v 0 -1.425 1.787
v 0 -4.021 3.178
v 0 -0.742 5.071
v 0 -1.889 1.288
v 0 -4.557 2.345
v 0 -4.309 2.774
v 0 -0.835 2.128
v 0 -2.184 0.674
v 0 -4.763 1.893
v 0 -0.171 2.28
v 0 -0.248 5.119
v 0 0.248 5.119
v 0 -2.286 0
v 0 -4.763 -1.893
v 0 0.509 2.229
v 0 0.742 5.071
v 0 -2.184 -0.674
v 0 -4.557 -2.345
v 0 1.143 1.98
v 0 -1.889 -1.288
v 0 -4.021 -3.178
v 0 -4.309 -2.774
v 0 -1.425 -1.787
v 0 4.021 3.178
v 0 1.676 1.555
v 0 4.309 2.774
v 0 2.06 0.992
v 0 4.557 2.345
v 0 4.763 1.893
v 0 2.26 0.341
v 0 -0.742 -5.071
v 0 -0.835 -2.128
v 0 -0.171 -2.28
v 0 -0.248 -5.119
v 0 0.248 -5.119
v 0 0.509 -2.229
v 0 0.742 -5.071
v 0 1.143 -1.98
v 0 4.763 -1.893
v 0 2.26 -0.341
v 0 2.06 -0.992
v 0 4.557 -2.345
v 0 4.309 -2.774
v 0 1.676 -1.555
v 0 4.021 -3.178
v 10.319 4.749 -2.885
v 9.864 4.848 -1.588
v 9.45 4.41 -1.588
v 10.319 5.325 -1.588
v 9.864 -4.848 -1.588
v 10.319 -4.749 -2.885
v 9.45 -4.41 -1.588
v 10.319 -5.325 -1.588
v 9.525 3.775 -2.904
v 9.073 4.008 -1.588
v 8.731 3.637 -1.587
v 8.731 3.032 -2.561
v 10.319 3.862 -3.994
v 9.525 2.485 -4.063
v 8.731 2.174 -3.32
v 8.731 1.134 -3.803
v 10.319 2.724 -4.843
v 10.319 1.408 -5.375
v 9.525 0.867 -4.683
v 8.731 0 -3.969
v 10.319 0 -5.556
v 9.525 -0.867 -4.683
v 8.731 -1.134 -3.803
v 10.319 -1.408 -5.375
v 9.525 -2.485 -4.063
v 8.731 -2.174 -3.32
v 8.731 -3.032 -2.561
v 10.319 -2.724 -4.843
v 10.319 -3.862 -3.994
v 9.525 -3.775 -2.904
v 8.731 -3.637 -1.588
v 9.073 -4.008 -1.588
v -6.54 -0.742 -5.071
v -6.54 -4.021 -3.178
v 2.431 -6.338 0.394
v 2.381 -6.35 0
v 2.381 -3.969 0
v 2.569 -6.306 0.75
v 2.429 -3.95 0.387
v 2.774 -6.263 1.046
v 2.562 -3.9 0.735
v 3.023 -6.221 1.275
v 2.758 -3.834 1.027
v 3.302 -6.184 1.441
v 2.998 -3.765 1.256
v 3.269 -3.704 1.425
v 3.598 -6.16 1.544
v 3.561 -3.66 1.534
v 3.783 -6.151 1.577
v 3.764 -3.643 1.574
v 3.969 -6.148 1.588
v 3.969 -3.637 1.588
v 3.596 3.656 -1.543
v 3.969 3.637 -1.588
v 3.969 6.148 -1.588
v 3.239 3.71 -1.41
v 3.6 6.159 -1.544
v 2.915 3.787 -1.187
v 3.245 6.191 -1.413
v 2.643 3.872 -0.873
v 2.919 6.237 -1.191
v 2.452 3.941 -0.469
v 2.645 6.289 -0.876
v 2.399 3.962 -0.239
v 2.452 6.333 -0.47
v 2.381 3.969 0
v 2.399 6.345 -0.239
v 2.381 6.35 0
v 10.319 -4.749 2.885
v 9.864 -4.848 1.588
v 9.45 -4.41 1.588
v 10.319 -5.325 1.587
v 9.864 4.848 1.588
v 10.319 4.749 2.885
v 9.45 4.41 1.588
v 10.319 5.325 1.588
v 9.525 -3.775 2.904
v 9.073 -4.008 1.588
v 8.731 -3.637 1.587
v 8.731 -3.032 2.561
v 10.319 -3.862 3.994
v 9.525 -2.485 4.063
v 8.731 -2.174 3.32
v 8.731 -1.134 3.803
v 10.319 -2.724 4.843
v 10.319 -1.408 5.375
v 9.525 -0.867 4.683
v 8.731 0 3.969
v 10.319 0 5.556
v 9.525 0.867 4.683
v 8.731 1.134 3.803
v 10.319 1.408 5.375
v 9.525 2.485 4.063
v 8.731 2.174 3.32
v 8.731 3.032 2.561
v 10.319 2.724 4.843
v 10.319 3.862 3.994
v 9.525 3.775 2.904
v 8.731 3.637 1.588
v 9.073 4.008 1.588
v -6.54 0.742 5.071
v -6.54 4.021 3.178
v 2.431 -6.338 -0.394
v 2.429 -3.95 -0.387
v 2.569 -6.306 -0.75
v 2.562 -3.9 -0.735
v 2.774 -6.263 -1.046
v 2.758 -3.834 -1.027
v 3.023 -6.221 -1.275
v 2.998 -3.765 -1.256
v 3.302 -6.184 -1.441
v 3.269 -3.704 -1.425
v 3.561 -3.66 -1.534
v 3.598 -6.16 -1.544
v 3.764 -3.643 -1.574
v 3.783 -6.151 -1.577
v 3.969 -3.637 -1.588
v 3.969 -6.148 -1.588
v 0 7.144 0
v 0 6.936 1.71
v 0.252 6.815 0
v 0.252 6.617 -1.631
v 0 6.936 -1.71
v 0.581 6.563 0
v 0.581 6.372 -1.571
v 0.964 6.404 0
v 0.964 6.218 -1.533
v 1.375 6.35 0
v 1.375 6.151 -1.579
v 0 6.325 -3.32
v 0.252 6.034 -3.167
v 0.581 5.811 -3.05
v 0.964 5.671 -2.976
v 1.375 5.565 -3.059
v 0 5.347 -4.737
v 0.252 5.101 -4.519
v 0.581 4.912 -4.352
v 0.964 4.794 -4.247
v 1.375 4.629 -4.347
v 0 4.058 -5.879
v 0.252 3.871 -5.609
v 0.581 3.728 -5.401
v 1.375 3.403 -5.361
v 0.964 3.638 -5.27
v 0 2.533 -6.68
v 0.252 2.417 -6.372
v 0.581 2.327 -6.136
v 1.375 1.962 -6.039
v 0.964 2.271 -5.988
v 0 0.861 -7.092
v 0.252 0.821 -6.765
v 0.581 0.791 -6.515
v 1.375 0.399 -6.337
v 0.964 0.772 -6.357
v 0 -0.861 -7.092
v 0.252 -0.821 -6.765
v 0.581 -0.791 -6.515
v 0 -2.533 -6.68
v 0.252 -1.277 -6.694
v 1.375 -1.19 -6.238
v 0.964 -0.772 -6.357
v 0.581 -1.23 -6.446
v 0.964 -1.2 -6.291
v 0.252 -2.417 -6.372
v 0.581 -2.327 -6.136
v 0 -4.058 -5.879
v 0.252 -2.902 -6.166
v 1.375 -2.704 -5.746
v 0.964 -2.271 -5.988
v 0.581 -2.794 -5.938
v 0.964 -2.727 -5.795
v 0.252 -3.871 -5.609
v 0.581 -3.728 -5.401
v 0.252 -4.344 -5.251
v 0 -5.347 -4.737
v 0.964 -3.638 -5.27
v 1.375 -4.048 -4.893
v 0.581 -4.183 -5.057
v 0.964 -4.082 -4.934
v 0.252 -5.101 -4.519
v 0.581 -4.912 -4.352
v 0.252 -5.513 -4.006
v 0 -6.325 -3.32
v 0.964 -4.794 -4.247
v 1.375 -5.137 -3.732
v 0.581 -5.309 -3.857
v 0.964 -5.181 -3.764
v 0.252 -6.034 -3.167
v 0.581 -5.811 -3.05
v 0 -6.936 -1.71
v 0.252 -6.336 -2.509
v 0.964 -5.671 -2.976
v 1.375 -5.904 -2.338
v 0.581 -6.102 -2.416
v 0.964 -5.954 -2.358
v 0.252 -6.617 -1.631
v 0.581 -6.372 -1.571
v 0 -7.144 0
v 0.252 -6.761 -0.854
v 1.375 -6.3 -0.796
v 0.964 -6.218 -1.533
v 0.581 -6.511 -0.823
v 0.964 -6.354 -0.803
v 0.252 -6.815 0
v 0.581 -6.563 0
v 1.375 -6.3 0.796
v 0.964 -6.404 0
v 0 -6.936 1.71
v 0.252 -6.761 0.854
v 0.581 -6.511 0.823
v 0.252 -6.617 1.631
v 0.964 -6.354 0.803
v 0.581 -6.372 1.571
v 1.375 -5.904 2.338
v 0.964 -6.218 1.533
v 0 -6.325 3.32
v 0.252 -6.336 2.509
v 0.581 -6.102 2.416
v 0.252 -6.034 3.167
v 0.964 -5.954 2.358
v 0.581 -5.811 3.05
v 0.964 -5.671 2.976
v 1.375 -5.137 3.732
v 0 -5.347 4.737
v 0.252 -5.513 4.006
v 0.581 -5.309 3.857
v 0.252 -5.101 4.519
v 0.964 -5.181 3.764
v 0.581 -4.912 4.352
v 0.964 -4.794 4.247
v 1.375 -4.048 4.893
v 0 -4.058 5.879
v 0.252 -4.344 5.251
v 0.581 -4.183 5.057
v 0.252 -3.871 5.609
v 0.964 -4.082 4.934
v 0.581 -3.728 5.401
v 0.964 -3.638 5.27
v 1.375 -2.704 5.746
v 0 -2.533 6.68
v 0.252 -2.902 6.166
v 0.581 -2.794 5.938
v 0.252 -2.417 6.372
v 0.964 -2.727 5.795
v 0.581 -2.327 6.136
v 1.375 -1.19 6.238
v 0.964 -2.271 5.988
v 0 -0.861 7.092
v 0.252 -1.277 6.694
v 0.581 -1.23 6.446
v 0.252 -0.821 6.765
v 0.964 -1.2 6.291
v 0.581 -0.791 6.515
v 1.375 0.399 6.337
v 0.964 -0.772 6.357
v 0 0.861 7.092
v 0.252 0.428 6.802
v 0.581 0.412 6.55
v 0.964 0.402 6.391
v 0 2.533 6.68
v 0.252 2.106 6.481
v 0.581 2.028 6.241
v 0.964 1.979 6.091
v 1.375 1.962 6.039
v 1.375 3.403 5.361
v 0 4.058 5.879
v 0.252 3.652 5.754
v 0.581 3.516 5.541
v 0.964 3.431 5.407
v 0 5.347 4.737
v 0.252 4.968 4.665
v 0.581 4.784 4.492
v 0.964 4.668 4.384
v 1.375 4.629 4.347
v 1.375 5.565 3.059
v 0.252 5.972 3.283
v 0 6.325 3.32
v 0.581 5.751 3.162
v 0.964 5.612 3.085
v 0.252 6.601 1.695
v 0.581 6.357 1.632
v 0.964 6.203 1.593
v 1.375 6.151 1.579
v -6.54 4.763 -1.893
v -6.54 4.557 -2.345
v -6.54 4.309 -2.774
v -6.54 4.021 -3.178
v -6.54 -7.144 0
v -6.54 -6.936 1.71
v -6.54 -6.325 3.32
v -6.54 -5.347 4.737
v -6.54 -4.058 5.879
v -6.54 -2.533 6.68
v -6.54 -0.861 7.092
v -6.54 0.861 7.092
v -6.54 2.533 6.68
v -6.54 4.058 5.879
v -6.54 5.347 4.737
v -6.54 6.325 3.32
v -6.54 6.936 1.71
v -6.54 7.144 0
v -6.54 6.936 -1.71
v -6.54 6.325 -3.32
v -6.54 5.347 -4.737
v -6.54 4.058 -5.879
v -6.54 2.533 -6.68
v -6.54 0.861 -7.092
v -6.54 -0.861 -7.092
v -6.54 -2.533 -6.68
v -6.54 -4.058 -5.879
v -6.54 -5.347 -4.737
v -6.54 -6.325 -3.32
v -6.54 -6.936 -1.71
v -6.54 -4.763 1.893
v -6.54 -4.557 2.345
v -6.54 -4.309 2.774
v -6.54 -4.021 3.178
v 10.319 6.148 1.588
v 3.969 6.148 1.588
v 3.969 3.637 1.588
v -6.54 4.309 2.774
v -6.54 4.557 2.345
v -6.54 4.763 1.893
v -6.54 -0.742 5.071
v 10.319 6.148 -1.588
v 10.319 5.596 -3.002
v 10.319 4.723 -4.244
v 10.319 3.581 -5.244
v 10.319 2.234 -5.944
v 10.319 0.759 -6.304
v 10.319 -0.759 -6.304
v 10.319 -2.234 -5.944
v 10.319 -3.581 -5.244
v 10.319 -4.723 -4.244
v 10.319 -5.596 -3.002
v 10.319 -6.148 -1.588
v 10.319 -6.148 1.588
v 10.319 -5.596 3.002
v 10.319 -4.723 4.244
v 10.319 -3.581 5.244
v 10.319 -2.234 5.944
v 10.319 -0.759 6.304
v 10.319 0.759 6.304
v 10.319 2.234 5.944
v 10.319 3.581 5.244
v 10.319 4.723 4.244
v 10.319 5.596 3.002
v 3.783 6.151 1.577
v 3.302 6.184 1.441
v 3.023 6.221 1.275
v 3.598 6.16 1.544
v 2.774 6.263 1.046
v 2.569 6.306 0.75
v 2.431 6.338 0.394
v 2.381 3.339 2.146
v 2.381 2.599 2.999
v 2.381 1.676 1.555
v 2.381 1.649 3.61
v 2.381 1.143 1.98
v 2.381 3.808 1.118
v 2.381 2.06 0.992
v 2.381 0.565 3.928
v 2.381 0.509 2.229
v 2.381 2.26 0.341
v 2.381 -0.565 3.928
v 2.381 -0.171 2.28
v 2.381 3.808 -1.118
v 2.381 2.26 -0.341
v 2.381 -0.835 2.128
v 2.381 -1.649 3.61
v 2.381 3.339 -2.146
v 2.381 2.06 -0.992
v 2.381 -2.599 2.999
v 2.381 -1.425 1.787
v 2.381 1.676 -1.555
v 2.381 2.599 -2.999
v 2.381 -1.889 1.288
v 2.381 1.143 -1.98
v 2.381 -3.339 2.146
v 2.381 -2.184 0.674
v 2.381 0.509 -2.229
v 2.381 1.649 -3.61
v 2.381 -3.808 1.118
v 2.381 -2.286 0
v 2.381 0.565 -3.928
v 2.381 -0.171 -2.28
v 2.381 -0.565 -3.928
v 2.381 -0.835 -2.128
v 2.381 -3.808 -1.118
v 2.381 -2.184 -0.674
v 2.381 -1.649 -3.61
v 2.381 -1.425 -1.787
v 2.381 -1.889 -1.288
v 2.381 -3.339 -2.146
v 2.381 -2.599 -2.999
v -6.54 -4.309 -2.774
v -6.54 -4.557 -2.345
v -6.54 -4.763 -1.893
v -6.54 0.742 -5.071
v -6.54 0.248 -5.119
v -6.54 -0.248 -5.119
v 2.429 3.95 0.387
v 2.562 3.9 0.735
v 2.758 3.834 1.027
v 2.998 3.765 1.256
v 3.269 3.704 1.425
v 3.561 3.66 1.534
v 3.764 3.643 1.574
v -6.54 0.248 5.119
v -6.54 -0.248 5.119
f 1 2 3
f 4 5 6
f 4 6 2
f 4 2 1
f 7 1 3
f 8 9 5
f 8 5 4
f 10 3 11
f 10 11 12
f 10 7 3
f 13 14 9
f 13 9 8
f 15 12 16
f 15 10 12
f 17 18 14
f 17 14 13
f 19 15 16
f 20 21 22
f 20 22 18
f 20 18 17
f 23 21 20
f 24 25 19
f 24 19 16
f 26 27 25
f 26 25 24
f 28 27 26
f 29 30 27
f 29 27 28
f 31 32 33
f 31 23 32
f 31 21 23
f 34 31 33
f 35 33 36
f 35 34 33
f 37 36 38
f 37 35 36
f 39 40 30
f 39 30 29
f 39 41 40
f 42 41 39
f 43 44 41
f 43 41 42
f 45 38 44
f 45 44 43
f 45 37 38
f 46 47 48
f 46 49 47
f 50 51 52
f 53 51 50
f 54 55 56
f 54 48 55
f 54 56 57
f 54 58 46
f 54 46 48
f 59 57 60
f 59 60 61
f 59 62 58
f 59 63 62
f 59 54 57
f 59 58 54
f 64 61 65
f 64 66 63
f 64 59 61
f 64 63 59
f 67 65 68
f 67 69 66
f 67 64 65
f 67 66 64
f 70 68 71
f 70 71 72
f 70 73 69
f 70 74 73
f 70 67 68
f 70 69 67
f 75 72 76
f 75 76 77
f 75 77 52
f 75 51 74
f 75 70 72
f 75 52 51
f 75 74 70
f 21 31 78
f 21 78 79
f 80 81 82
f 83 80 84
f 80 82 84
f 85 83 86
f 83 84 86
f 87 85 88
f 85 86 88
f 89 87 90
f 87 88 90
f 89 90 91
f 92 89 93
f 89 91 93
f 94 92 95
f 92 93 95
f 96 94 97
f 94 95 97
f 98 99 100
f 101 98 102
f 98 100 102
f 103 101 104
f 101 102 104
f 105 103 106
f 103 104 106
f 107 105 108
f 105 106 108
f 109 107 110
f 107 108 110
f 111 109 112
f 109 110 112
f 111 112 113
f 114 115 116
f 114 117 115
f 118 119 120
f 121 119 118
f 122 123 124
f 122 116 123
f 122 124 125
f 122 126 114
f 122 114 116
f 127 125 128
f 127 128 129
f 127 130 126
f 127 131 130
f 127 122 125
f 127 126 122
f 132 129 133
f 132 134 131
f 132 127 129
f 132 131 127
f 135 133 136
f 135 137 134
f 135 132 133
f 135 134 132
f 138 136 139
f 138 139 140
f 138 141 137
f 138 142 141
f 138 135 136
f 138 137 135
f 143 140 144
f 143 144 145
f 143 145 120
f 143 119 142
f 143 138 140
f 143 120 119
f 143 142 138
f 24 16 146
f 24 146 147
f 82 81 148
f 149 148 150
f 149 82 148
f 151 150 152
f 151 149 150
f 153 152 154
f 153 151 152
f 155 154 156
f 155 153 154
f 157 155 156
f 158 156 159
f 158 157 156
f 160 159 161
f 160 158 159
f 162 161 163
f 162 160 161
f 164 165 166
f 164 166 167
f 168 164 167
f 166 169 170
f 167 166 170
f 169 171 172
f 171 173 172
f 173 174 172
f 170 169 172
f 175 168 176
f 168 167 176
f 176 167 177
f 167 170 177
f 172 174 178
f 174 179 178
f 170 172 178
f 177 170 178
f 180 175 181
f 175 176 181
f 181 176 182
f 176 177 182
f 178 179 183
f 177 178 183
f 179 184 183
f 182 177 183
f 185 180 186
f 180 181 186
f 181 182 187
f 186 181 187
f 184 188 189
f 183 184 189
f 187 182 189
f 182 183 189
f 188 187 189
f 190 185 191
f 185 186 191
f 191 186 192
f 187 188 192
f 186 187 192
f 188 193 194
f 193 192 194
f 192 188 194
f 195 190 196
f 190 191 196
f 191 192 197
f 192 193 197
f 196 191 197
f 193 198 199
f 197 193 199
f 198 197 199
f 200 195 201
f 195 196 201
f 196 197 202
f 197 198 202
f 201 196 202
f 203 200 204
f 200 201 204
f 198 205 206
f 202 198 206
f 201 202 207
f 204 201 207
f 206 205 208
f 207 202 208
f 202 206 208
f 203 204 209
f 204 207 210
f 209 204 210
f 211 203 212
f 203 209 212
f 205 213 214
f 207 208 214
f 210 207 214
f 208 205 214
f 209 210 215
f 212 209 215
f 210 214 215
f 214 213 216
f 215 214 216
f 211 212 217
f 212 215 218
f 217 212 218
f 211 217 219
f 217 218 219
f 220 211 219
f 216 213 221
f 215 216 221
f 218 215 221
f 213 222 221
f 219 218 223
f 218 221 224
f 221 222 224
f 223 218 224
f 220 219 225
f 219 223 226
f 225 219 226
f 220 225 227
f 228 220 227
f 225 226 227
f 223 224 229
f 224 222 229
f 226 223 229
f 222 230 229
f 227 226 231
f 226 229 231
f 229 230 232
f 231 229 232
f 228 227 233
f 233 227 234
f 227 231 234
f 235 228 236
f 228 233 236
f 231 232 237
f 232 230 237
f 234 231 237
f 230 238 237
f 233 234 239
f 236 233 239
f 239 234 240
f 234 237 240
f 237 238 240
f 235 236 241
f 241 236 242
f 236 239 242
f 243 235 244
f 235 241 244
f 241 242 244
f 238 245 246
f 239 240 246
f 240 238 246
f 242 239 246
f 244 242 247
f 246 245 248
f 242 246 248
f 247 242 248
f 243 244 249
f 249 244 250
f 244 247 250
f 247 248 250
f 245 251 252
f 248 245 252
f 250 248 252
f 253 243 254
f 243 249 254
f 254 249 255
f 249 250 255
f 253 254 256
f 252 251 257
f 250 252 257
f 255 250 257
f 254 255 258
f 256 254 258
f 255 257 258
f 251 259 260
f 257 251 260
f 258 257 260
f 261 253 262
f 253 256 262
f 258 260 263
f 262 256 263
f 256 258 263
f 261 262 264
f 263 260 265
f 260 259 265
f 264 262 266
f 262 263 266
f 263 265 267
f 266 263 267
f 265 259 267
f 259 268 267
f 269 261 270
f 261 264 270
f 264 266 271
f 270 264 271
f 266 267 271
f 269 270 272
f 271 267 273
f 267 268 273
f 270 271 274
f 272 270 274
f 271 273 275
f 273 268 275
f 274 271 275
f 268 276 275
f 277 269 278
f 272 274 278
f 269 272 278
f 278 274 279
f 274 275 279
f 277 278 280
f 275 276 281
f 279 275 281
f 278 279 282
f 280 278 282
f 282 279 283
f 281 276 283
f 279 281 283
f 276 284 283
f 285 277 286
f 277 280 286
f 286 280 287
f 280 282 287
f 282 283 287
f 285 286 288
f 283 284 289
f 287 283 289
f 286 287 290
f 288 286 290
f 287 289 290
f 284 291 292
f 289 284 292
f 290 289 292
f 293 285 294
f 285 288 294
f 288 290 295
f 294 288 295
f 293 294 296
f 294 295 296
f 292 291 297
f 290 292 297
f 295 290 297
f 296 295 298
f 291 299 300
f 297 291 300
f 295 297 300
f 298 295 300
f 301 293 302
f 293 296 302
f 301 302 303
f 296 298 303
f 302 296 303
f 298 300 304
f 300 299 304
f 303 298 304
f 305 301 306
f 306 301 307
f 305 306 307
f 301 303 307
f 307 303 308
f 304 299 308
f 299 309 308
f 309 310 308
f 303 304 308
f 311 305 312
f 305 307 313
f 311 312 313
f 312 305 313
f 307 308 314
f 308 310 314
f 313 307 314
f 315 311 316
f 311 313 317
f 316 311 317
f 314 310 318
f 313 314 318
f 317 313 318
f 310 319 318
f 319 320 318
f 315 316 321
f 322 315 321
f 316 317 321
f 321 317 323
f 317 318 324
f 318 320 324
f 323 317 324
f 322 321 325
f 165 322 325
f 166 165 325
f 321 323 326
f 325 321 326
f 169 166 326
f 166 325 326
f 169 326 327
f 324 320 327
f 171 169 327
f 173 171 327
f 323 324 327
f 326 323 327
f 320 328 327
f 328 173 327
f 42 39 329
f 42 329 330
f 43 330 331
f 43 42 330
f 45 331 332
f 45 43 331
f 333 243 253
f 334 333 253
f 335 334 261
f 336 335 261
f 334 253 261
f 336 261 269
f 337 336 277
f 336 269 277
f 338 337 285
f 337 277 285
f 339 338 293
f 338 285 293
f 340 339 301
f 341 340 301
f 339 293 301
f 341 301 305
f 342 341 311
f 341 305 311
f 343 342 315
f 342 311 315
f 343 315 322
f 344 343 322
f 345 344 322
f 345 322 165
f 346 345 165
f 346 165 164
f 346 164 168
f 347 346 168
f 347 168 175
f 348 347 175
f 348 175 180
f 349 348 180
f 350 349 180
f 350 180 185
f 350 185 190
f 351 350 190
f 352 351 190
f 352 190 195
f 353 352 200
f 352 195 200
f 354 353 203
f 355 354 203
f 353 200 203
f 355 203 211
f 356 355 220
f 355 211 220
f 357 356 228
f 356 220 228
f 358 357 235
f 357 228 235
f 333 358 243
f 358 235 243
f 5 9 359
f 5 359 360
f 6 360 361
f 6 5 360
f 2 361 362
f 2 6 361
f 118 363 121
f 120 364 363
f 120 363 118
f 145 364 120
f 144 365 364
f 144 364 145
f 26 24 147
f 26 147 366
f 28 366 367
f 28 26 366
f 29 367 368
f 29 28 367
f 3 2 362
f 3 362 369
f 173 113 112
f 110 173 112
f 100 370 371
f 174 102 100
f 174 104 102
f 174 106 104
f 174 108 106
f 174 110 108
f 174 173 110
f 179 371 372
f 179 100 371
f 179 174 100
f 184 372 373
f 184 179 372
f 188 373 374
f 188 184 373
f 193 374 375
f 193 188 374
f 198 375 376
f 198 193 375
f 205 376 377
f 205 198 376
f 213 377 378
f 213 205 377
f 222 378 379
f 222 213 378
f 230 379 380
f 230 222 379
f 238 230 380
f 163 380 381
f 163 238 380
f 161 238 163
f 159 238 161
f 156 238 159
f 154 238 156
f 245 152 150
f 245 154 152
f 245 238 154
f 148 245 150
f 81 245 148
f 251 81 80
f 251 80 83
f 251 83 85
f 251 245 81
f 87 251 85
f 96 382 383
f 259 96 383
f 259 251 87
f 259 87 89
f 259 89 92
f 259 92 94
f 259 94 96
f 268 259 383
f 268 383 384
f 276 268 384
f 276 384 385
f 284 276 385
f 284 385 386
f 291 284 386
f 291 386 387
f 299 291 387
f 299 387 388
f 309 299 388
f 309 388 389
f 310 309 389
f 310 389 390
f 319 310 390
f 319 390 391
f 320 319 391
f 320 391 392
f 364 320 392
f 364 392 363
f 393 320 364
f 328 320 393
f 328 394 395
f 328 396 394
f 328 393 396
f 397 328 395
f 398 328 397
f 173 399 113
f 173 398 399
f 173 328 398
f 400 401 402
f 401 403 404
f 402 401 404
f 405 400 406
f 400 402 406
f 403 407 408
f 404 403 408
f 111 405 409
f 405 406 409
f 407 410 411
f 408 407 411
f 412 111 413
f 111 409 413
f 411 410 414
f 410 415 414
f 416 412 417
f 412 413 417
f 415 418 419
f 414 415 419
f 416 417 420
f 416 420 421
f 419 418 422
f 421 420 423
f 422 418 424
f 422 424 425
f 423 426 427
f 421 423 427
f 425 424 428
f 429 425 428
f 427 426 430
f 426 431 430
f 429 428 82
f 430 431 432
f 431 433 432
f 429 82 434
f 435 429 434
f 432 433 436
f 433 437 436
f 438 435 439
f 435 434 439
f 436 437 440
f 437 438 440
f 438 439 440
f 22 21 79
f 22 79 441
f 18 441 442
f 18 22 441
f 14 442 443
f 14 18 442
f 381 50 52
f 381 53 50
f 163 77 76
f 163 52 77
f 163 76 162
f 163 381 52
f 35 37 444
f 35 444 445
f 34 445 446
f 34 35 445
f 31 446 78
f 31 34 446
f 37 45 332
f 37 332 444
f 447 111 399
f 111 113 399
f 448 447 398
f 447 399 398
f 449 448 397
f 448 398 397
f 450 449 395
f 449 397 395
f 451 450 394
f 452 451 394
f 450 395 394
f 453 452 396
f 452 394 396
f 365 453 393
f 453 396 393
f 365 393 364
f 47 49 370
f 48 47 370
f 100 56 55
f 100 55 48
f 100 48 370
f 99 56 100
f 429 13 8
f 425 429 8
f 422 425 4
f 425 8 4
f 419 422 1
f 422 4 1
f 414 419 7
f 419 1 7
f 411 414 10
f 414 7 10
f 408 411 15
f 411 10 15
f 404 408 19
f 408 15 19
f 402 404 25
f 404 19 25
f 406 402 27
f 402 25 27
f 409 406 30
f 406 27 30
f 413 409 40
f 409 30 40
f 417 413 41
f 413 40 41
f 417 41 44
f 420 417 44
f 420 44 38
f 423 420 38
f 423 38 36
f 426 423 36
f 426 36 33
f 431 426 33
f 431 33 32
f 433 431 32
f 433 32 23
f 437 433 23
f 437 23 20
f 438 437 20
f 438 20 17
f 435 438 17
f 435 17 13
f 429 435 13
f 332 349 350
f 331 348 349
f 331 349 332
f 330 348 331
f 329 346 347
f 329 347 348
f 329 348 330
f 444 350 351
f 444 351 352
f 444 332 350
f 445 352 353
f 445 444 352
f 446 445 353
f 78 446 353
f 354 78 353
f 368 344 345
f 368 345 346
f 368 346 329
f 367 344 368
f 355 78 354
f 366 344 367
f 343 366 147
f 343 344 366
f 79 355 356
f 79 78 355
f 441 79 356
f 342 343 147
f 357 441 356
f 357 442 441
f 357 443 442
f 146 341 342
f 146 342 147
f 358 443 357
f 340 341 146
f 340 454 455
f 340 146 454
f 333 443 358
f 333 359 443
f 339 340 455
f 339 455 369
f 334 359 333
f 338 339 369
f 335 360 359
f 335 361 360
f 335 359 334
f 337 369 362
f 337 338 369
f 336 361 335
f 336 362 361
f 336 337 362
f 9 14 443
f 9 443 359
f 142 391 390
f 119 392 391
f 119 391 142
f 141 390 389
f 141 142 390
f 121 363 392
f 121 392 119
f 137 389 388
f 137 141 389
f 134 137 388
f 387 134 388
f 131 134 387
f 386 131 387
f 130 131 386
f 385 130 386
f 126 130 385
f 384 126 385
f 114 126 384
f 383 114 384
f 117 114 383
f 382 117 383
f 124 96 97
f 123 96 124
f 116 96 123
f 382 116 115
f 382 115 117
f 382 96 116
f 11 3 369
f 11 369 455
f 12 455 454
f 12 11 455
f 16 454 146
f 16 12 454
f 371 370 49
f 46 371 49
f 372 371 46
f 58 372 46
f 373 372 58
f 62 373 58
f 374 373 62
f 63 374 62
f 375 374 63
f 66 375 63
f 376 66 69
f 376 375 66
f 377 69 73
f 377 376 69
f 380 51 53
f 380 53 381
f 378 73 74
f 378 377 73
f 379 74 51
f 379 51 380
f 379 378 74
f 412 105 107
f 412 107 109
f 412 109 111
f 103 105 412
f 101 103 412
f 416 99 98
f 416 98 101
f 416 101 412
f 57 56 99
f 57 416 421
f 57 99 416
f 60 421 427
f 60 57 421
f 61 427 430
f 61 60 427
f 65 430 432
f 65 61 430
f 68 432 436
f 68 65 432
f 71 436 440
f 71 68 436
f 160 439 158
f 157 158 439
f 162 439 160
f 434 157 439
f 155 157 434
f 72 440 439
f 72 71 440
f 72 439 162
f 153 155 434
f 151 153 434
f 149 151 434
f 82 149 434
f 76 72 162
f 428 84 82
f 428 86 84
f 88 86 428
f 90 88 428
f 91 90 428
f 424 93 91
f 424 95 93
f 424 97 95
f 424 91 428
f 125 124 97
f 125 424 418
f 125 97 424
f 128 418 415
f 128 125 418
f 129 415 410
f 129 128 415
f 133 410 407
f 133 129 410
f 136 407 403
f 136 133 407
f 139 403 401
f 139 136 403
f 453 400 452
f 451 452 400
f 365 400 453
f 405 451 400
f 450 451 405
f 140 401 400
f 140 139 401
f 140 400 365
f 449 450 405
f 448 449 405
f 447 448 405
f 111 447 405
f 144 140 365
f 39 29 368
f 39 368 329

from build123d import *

# Parameters (mm, degrees)
SKETCH1_W               = 25.4
SKETCH1_H               = 3.175
SKETCH1_W_2             = 1.5875
SKETCH1_H_2             = 1.5875
SKETCH1_W_3             = 7.9375
SKETCH1_H_3             = 2.38125
CUT_EXTRUDE1_DEPTH      = 27.940768363
CUT_EXTRUDE1_DEPTH_BACK = 27.940768363
SKETCH2_W               = 0.79375
SKETCH2_H               = 3.175
SKETCH2_R               = 1.5875
FILLET1_R               = 1.5875
CHAMFER1_SIZE           = 1.5875
CUT_EXTRUDE2_DEPTH      = 27.94076841
SKETCH3_3_R             = 2.286
CUT_EXTRUDE3_DEPTH      = 14.67923997
SKETCH3_4_R             = 7.14375
BOSS_EXTRUDE1_DEPTH     = 6.5405
FILLET2_R               = 1.5875


# Some blends are built 0.0001 mm under size
with BuildPart() as part:
    # Sketch1 → Revolve1 (revolve)
    with BuildSketch(Plane.XY):
        with Locations((-12.7, 1.5875)):
            Rectangle(SKETCH1_W, SKETCH1_H)
        with Locations((-0.79375, 3.96875)):
            Rectangle(SKETCH1_W_2, SKETCH1_H_2)
        Polygon((0, 3.175), (0, 0), (2.38125, 0), (2.38125, 3.96875), (2.38125, 6.35), (0, 6.35), (0, 4.7625), align=None)
        with Locations((6.35, 5.159375)):
            Rectangle(SKETCH1_W_3, SKETCH1_H_3)
    revolve(axis=Axis((0, 0, 0), (-1, 0, 0)))

    # Sketch2 → Cut-Extrude1 (cut, two sides: drawn at the far end of the back side and taken through both)
    with BuildSketch(Plane(origin=(0, 0, 0), x_dir=(1, 0, 0), z_dir=(0, 1, 0)).offset(-CUT_EXTRUDE1_DEPTH_BACK)):
        with Locations((2.778125, 0)):
            Rectangle(SKETCH2_W, SKETCH2_H)
        with BuildLine():
            Line((3.175, -1.5875), (6.35, -1.5875))
            ThreePointArc((6.35, -1.5875), (4.7625, 0), (6.35, 1.5875))
            Line((6.35, 1.5875), (3.175, 1.5875))
            Line((3.175, 1.5875), (3.175, -1.5875))
        make_face()
        with Locations((6.35, 0)):
            Circle(SKETCH2_R)
        with BuildLine():
            Line((6.35, -1.5875), (10.31875, -1.5875))
            Line((10.31875, -1.5875), (10.31875, 1.5875))
            Line((10.31875, 1.5875), (6.35, 1.5875))
            ThreePointArc((6.35, 1.5875), (7.472532015, 1.122532015), (7.9375, 0))
            ThreePointArc((7.9375, 0), (7.472532015, -1.122532015), (6.35, -1.5875))
        make_face()
    extrude(amount=CUT_EXTRUDE1_DEPTH + CUT_EXTRUDE1_DEPTH_BACK, mode=Mode.SUBTRACT)

    # Fillet1
    fillet1_edges = [part.edges().sort_by_distance(p)[0] for p in [
        (2.38125, -4.89289026, -1.5875),
        (2.38125, 4.89289026, -1.5875),
        (2.38125, -4.89289026, 1.5875),
        (2.38125, 4.89289026, 1.5875),
    ]]
    fillet(fillet1_edges, radius=FILLET1_R - 0.0001)  # a hair under: the kernel refuses the full size

    # Chamfer1
    chamfer1_edges = [part.edges().sort_by_distance(p)[0] for p in [
        (10.31875, 0, 3.96875),
        (10.31875, 0, -3.96875),
    ]]
    chamfer(chamfer1_edges, length=CHAMFER1_SIZE)

    # Sketch3 → Cut-Extrude2 (cut, through all)
    with BuildSketch(Plane.ZY):
        with BuildLine():
            Line((-5.034429311, 5.567612646), (-7.338908645, 1.576137354))
            ThreePointArc((-7.338908645, 1.576137354), (-7.50625, 0), (-7.338908645, -1.576137354))
            Line((-7.338908645, -1.576137354), (-5.034429311, -5.567612646))
            ThreePointArc((-5.034429311, -5.567612646), (-3.753125, -6.500603187), (-2.304479334, -7.14375))
            Line((-2.304479334, -7.14375), (2.304479334, -7.14375))
            ThreePointArc((2.304479334, -7.14375), (3.753125, -6.500603187), (5.034429311, -5.567612646))
            Line((5.034429311, -5.567612646), (7.338908645, -1.576137354))
            ThreePointArc((7.338908645, -1.576137354), (7.50625, 0), (7.338908645, 1.576137354))
            Line((7.338908645, 1.576137354), (5.034429311, 5.567612646))
            ThreePointArc((5.034429311, 5.567612646), (3.753125, 6.500603187), (2.304479334, 7.14375))
            Line((2.304479334, 7.14375), (-2.304479334, 7.14375))
            ThreePointArc((-2.304479334, 7.14375), (-3.753125, 6.500603187), (-5.034429311, 5.567612646))
        make_face()
    extrude(amount=CUT_EXTRUDE2_DEPTH, mode=Mode.SUBTRACT)

    # Sketch3<3> → Cut-Extrude3 (cut, through all)
    with BuildSketch(Plane.ZY):
        with Locations(Location((0, 0, 0), (0, 0, 270))):
            Circle(SKETCH3_3_R)
    extrude(amount=-CUT_EXTRUDE3_DEPTH, mode=Mode.SUBTRACT)

    # Sketch3<4> → Boss-Extrude1 (add)
    with BuildSketch(Plane.ZY):
        with Locations(Location((0, 0, 0), (0, 0, 270))):
            Circle(SKETCH3_4_R)
        with BuildLine():
            Line((3.177844334, -4.020812156), (5.071047637, -0.741687844))
            ThreePointArc((5.071047637, -0.741687844), (5.125, 0), (5.071047637, 0.741687844))
            Line((5.071047637, 0.741687844), (3.177844334, 4.020812156))
            ThreePointArc((3.177844334, 4.020812156), (2.5625, 4.438380194), (1.893203304, 4.7625))
            Line((1.893203304, 4.7625), (-1.893203304, 4.7625))
            ThreePointArc((-1.893203304, 4.7625), (-2.5625, 4.438380194), (-3.177844334, 4.020812156))
            Line((-3.177844334, 4.020812156), (-5.071047637, 0.741687844))
            ThreePointArc((-5.071047637, 0.741687844), (-5.125, 0), (-5.071047637, -0.741687844))
            Line((-5.071047637, -0.741687844), (-3.177844334, -4.020812156))
            ThreePointArc((-3.177844334, -4.020812156), (-2.5625, -4.438380194), (-1.893203304, -4.7625))
            Line((-1.893203304, -4.7625), (1.893203304, -4.7625))
            ThreePointArc((1.893203304, -4.7625), (2.5625, -4.438380194), (3.177844334, -4.020812156))
        make_face(mode=Mode.SUBTRACT)
    extrude(amount=BOSS_EXTRUDE1_DEPTH)

    # Fillet2
    # the kernel refuses this fillet: 1.5875 mm, written as the material it adds along each edge
    with BuildSketch(Plane(origin=(0, 0, 0), x_dir=(0, 1, 0), z_dir=(0, 0, 1))) as fillet2_piece_1:
        with BuildLine():
            CenterArc((7.9375, -1.374815329), FILLET2_R, 120, 60)
            Line((7.14375, 0), (7.127875, 0.027496307))
            ThreePointArc((7.127875, 0.027496307), (6.746875, 0.03175), (6.35, 0.03175))
            Line((6.35, 0.03175), (6.31825, 0))
            Line((6.31825, 0), (6.31825, -1.374815329))
            Line((6.31825, -1.374815329), (6.35, -1.374815329))
        make_face()
    revolve(axis=Axis((0, 0, 0), (-1, 0, 0)))


solid = part.part
